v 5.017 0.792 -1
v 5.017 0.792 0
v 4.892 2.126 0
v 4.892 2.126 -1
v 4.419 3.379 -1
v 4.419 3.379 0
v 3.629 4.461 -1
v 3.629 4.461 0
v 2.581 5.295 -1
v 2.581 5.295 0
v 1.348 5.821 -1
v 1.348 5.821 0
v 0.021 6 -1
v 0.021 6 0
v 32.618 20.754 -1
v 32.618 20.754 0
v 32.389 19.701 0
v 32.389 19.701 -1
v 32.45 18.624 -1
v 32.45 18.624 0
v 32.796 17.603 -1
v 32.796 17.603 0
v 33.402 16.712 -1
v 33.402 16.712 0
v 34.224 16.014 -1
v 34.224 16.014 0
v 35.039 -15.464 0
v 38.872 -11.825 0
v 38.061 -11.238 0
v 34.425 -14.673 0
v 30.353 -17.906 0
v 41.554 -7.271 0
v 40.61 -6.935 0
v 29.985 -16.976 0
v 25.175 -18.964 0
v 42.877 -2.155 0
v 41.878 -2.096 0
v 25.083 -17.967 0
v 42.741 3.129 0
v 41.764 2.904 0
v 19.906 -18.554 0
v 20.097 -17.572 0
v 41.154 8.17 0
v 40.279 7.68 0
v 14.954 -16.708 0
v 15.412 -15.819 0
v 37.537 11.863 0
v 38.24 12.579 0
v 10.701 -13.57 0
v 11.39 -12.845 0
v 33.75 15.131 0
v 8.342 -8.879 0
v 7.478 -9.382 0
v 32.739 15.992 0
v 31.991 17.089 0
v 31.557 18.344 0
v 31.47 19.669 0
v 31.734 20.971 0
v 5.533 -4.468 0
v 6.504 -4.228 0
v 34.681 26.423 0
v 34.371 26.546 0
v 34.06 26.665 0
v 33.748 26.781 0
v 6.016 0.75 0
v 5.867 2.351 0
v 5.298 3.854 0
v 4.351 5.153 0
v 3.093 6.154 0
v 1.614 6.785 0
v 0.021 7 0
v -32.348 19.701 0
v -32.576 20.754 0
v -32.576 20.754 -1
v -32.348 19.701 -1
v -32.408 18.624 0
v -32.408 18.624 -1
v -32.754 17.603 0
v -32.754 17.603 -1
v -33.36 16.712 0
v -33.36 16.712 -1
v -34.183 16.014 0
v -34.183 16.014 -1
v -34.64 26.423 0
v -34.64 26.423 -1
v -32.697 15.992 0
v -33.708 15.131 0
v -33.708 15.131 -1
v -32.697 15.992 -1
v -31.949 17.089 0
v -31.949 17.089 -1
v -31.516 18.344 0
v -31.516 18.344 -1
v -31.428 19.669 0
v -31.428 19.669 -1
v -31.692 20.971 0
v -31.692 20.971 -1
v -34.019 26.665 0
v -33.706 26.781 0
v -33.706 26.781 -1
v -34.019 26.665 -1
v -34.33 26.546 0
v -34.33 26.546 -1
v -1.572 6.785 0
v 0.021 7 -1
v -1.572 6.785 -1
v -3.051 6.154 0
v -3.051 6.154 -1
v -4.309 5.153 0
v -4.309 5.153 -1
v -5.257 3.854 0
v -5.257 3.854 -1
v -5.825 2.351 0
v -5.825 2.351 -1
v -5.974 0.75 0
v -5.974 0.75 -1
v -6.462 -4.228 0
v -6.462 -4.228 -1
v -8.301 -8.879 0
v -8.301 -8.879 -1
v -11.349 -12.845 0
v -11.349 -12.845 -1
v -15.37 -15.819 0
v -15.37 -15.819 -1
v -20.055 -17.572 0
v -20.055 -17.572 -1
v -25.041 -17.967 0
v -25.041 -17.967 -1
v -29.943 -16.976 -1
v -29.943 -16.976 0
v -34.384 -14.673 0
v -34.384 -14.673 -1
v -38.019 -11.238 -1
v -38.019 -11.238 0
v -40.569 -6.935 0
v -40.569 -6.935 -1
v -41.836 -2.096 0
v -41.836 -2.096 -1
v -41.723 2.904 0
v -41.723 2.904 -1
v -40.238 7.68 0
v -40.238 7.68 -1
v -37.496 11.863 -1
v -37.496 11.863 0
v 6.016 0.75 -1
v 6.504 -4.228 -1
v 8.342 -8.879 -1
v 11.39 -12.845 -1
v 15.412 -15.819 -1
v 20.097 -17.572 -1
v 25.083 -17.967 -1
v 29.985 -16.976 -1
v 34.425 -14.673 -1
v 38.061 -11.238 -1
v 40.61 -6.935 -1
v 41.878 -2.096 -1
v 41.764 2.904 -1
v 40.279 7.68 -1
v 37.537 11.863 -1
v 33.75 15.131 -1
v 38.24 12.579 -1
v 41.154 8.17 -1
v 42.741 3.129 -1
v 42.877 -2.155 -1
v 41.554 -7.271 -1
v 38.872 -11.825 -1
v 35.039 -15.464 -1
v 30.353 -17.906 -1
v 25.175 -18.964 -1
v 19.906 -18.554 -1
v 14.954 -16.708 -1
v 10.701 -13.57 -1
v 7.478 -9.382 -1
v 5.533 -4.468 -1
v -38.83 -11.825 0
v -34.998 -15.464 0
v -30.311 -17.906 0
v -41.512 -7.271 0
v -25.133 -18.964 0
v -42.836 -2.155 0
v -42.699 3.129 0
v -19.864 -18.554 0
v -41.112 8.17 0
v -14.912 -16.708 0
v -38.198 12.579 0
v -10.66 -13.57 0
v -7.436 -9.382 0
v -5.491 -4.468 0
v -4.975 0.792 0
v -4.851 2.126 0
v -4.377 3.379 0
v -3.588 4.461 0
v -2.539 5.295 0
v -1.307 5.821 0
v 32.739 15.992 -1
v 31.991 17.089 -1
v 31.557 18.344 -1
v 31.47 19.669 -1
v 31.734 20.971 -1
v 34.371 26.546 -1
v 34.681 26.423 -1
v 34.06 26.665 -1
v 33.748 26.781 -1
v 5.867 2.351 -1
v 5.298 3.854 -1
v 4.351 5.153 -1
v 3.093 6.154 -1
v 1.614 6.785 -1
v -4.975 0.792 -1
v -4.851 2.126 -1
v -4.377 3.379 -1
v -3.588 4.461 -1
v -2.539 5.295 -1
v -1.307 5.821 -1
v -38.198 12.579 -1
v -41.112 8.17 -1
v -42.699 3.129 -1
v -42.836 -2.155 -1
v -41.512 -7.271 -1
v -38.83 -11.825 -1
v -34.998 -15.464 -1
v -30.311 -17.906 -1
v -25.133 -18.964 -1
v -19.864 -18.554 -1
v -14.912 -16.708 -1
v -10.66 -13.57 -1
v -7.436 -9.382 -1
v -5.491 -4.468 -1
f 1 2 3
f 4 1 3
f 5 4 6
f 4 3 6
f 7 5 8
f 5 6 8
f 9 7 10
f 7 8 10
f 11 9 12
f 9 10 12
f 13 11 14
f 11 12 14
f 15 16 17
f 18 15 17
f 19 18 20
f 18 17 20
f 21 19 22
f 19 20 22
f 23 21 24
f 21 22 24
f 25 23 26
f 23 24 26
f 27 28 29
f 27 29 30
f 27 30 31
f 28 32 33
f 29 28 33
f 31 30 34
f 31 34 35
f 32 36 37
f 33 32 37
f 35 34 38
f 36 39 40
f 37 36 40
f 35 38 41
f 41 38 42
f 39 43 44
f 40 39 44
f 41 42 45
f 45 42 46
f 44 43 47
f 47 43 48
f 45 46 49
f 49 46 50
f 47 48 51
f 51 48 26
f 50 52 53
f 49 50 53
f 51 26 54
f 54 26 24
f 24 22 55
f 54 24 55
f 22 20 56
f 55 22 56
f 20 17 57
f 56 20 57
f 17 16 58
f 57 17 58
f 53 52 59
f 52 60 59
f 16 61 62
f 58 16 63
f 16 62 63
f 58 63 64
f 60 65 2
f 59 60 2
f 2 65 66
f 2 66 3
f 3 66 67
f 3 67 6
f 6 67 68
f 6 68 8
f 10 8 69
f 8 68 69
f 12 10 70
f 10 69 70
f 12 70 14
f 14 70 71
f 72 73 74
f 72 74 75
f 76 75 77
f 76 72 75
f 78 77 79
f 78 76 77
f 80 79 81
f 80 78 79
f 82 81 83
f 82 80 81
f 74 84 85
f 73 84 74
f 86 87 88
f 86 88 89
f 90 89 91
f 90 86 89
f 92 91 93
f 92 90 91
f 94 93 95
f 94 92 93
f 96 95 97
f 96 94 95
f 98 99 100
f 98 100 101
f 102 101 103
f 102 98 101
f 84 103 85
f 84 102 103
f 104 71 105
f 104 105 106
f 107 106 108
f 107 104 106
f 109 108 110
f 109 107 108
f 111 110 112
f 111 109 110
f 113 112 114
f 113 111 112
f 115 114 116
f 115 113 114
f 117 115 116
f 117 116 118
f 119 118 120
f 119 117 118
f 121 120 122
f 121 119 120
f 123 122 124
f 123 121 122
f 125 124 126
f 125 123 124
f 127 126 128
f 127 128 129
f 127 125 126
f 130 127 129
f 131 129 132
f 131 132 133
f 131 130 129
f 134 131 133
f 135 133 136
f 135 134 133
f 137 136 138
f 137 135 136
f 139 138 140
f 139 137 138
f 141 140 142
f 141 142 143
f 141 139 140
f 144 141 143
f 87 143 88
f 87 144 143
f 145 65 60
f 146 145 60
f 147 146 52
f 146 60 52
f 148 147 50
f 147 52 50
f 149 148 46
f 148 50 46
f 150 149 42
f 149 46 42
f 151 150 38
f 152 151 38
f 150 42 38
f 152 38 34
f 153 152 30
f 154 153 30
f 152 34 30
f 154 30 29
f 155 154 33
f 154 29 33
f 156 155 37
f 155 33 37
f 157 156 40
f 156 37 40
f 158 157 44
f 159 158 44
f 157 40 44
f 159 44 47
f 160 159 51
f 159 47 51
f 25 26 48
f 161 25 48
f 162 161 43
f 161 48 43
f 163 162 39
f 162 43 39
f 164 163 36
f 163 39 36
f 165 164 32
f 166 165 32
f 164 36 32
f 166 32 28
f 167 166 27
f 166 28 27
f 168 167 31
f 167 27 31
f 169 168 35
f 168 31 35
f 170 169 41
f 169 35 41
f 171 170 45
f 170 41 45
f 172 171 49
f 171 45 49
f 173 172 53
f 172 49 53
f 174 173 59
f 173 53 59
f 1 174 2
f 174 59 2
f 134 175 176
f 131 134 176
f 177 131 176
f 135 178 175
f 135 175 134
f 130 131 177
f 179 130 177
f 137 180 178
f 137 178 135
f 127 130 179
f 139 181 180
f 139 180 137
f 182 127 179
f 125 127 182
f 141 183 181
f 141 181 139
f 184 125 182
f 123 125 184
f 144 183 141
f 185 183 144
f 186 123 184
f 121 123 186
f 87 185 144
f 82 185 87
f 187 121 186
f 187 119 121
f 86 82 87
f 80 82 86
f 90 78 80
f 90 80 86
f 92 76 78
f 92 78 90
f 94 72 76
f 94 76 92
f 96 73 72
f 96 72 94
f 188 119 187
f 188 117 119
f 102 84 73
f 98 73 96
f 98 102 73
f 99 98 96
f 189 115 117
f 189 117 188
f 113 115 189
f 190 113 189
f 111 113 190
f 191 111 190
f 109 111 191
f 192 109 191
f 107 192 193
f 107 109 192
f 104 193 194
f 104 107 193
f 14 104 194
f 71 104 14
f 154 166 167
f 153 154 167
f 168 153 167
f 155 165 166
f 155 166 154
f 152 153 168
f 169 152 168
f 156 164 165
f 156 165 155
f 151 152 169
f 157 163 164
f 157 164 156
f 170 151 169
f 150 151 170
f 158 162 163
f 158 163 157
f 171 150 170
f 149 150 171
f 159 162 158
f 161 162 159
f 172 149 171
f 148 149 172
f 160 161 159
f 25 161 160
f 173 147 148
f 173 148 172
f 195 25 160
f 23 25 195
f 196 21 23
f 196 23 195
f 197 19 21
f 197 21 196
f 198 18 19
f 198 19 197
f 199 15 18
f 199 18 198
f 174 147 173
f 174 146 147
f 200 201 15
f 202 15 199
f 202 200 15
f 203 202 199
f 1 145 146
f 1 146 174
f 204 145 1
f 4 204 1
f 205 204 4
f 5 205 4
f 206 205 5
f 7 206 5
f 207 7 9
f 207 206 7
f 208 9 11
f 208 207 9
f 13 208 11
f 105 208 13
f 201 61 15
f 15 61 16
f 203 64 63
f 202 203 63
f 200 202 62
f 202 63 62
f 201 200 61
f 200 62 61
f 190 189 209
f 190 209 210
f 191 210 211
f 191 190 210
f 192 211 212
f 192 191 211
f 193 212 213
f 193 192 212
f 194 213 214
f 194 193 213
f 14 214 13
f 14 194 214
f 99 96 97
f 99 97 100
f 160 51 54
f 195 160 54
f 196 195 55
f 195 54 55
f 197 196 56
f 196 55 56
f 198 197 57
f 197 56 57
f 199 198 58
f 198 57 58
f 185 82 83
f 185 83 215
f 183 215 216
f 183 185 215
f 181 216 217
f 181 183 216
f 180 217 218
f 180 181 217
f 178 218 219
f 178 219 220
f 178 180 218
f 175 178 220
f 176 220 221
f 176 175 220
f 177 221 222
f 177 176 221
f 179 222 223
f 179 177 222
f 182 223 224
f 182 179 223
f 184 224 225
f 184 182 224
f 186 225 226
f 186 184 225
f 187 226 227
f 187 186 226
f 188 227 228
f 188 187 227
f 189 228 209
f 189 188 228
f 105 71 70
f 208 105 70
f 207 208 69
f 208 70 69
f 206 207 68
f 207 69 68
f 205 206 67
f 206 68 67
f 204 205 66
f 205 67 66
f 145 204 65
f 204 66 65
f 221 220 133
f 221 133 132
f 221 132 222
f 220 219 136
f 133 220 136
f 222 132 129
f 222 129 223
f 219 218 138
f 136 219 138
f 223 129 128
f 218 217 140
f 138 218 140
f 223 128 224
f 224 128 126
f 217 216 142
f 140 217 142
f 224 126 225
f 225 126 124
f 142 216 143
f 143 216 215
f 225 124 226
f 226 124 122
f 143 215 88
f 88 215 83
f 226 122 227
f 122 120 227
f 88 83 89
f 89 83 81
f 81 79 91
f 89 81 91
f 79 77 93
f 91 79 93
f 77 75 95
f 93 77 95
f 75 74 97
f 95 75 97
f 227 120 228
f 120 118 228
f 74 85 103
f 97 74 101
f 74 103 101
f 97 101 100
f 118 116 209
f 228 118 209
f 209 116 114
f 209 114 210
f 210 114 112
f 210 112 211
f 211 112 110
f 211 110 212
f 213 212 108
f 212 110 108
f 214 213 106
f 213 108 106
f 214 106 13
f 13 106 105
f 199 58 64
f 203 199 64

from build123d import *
from build123d.topology import SkipClean

# Parameters (mm, degrees)
BASE_EXTRUSION_DEPTH = 1


with BuildPart() as part:
    # Esquisse2 → Base-Extrusion (new body)
    with BuildSketch(Plane.XY):
        with BuildLine():
            Line((34.681264504, 26.422728636), (32.618025795, 20.754026872))
            ThreePointArc((32.618025795, 20.754026872), (32.588449466, 18.102034919), (34.224309969, 16.014477377))
            ThreePointArc((34.224309969, 16.014477377), (32.781477268, -16.8489067), (5.01650022, 0.791666667))
            ThreePointArc((5.01650022, 0.791666667), (3.629281566, 4.461093276), (0.020842383, 6))
            Line((0.020842383, 6), (0.020842383, 7))
            ThreePointArc((0.020842383, 7), (4.350969402, 5.153311931), (6.015631788, 0.75))
            ThreePointArc((6.015631788, 0.75), (32.285641023, -15.979616793), (33.750040286, 15.130654792))
            ThreePointArc((33.750040286, 15.130654792), (31.732063255, 17.702086165), (31.734019754, 20.970799485))
            Line((31.734019754, 20.970799485), (33.747574085, 26.781239692))
            ThreePointArc((33.747574085, 26.781239692), (34.215992075, 26.606080244), (34.681264504, 26.422728636))
        make_face()
    extrude(amount=-BASE_EXTRUSION_DEPTH)

    # Bossage-Symétrie1: part across plane


with BuildPart() as part_1:
    with SkipClean():  # the faces are left unmerged after this step: merging them gives an invalid solid
        add(part.part)
        add(part.part.mirror(Plane(origin=(0.020842383, 7, -1), x_dir=(0, 0, 1), z_dir=(-1, 0, 0))))


solid = part_1.part
